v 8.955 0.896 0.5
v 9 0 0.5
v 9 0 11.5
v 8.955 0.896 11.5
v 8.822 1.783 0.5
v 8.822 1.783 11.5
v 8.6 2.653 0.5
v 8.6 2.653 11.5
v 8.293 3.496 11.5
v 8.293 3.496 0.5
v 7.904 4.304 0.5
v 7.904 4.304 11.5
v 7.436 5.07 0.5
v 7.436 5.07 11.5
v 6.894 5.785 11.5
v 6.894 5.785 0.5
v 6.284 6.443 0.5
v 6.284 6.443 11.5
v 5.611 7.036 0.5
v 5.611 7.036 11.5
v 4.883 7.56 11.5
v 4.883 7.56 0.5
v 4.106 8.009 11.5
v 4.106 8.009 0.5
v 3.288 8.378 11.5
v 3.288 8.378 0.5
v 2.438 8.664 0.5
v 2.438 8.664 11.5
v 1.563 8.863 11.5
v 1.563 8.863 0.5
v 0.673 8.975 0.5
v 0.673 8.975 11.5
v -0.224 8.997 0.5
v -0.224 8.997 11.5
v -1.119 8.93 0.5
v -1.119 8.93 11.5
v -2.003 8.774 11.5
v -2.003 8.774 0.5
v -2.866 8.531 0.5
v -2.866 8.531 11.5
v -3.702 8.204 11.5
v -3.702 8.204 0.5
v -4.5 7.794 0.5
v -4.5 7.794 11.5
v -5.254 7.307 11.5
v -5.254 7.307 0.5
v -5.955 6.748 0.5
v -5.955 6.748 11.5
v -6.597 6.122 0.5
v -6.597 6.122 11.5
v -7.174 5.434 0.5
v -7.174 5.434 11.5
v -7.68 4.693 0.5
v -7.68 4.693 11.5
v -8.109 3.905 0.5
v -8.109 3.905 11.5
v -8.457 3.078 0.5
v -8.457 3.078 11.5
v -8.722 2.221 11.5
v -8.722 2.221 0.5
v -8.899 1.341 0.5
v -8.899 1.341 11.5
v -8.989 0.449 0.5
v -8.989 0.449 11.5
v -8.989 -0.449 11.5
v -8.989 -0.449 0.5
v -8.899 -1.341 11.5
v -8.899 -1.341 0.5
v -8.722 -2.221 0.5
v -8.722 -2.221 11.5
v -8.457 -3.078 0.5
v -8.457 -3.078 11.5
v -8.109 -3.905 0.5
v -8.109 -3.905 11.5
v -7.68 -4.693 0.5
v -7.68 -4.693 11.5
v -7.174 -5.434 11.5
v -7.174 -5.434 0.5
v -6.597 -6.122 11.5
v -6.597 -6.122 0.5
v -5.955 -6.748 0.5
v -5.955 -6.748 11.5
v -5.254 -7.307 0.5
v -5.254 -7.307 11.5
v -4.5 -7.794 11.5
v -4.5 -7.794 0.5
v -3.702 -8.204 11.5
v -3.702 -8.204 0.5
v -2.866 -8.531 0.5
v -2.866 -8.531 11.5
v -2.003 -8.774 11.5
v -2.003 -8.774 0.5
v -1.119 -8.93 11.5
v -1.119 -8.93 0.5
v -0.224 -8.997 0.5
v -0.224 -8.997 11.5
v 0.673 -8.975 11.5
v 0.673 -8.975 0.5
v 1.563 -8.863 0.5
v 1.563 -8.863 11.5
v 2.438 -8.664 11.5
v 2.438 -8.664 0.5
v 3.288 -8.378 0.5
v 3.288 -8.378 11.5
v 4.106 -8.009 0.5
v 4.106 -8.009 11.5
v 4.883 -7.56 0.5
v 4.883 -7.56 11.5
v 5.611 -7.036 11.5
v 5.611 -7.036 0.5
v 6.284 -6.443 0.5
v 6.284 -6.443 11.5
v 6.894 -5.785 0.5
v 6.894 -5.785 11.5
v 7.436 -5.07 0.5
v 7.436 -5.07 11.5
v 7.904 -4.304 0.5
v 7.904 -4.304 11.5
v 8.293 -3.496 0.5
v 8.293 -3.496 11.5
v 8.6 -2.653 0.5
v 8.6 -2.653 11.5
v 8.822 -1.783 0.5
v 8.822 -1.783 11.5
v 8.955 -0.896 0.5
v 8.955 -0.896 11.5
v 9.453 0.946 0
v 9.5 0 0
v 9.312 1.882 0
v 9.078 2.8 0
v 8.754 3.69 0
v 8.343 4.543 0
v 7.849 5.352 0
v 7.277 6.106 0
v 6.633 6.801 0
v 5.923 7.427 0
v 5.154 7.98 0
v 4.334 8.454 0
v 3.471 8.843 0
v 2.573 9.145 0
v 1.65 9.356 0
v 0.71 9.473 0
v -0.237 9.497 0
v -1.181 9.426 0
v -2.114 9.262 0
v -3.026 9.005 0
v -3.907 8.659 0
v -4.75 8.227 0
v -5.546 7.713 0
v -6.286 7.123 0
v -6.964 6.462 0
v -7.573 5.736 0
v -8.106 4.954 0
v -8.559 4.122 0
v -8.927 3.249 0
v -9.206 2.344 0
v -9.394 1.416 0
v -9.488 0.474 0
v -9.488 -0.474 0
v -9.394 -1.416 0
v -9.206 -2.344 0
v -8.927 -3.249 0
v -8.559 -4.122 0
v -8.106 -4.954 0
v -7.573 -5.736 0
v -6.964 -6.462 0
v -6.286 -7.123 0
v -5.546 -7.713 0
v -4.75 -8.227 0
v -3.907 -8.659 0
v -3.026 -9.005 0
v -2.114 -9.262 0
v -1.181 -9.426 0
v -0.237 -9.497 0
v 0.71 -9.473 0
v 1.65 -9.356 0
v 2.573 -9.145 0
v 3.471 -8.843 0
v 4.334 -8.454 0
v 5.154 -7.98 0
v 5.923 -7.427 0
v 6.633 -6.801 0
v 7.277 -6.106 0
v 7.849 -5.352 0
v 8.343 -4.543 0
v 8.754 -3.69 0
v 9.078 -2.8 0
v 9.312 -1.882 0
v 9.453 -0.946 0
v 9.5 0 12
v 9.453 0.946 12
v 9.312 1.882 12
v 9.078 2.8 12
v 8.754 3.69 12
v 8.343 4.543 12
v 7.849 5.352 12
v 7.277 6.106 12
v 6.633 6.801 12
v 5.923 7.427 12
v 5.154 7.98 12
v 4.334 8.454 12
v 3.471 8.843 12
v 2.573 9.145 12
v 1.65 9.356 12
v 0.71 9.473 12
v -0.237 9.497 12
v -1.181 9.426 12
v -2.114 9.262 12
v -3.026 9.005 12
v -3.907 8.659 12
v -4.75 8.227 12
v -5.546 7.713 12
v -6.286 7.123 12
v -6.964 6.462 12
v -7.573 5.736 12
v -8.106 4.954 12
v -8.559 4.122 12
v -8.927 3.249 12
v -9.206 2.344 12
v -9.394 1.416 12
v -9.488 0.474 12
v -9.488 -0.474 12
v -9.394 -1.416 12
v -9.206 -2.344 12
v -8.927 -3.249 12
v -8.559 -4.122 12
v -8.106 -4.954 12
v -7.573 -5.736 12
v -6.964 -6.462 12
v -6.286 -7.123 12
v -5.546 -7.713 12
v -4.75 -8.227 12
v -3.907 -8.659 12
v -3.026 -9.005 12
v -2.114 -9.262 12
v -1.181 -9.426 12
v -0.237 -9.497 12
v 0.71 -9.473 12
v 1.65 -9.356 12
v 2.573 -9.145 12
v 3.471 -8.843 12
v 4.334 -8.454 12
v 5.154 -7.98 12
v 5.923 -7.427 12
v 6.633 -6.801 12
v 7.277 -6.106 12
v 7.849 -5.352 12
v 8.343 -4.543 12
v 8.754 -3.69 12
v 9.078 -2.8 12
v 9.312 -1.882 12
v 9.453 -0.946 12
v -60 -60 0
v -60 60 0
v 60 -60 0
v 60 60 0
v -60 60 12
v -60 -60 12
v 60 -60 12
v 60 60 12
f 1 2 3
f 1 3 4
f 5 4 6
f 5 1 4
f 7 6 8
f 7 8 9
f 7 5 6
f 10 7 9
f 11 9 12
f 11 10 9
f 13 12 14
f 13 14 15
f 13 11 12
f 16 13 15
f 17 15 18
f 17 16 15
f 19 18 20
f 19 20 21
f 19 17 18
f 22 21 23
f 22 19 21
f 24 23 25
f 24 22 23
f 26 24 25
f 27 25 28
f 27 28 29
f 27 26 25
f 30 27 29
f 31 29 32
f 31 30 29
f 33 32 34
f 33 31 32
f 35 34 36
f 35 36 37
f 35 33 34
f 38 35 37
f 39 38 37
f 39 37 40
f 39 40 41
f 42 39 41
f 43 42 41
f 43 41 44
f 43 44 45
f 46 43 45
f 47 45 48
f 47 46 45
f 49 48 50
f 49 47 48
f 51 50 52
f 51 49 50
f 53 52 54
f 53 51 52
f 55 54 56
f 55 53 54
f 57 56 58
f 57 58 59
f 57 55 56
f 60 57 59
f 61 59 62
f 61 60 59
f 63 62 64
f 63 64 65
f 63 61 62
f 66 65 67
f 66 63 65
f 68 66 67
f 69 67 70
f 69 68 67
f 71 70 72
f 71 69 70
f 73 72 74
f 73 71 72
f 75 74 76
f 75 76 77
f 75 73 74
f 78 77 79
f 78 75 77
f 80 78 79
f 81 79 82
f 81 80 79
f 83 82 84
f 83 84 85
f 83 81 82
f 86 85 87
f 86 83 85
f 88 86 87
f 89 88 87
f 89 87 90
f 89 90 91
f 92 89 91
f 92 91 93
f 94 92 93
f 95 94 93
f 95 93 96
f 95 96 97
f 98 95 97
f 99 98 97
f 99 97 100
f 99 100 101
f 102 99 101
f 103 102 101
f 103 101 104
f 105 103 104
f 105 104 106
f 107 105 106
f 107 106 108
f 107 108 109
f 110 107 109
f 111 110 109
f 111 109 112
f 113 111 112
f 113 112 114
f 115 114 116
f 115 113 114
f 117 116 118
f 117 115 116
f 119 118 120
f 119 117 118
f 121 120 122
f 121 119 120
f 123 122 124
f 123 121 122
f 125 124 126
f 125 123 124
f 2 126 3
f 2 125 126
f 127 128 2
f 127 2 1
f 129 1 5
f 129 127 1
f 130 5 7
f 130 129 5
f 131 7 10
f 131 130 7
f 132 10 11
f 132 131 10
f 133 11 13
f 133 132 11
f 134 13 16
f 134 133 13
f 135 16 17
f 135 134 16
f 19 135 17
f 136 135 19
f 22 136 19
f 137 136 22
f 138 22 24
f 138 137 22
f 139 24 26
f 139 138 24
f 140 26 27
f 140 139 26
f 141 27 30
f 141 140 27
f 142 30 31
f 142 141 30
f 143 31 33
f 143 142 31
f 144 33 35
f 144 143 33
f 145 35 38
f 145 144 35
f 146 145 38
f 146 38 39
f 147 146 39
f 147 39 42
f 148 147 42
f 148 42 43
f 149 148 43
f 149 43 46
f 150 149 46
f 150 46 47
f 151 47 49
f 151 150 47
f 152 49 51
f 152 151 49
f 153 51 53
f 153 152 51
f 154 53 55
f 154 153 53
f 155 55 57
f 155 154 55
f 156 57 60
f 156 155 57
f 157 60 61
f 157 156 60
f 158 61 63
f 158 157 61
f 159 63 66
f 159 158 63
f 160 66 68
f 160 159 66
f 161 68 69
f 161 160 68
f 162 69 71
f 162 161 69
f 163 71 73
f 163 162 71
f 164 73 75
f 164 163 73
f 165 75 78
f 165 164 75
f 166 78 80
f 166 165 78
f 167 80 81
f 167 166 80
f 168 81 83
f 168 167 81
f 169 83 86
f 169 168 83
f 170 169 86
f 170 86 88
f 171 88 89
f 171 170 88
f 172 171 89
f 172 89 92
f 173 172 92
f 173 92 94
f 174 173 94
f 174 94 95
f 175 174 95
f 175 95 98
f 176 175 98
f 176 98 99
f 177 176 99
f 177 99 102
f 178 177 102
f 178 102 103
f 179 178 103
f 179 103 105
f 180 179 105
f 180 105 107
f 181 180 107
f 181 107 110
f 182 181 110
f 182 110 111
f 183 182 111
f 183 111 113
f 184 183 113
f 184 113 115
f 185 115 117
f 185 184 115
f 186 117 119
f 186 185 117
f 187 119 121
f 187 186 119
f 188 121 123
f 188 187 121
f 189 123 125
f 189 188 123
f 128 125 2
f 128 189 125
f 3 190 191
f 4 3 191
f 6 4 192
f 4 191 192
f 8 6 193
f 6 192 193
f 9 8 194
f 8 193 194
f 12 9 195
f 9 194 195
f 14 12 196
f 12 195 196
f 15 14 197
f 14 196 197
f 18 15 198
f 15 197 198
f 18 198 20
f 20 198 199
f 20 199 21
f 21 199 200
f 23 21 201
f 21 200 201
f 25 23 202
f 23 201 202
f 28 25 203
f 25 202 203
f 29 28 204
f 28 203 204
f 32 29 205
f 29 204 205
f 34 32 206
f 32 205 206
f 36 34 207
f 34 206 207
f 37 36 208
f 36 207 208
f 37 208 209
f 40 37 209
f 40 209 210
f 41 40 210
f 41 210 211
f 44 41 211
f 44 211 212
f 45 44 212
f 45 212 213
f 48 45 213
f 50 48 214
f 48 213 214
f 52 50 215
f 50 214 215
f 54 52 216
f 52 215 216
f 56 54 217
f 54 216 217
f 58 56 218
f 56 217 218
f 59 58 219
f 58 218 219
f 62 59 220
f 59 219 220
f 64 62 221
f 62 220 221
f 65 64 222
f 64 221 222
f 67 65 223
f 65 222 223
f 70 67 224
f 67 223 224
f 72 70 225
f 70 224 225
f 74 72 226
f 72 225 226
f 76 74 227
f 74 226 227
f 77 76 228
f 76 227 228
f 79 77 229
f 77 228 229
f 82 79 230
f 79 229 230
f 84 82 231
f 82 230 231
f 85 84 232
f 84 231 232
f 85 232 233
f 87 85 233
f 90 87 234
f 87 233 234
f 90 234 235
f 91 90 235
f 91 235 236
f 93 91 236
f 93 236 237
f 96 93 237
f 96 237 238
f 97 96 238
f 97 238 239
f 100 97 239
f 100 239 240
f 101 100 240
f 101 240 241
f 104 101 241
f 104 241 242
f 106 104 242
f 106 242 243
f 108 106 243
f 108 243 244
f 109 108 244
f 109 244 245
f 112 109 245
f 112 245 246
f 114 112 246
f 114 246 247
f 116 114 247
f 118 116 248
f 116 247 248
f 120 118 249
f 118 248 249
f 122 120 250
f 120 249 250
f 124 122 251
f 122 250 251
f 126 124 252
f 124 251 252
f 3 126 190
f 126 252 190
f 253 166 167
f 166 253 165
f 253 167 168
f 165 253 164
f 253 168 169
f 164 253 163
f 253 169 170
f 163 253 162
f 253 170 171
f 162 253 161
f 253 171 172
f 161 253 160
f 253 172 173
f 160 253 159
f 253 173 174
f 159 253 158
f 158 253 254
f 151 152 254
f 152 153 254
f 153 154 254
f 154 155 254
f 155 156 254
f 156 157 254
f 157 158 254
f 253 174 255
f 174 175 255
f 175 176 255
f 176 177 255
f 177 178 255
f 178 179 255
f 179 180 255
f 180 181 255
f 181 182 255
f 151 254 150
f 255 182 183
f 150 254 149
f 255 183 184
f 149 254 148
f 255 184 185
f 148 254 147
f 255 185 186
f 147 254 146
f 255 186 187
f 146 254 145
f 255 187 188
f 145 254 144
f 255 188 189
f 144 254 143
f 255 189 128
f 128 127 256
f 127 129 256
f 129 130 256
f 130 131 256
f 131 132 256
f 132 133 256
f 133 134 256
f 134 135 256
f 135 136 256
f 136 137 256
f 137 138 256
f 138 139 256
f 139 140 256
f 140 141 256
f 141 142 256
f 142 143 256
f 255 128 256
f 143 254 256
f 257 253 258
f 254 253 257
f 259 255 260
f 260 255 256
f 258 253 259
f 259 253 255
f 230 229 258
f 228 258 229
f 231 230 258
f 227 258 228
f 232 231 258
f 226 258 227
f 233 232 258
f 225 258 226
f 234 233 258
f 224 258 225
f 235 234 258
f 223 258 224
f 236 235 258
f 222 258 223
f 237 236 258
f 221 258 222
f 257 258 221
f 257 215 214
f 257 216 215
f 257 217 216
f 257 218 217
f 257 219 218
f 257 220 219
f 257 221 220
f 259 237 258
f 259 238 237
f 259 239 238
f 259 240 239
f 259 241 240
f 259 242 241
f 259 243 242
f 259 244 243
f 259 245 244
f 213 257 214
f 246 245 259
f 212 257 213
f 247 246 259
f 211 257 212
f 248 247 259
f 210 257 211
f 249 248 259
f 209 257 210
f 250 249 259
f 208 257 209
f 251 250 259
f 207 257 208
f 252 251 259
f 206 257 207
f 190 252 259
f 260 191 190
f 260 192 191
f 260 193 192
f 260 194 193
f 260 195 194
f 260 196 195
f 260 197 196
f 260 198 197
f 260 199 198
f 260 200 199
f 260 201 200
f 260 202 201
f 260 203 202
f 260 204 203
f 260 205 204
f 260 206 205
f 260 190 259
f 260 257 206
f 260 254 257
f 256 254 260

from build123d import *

# Parameters (mm, degrees)
F0_W     = 120
F0_H     = 120
F0_R     = 9
F1_DEPTH = 12
F2_SIZE  = 0.5


with BuildPart() as f1:
    # F0 (on Top) → F1 (new body)
    with BuildSketch(Plane.XY):
        Rectangle(F0_W, F0_H)
        Circle(F0_R, mode=Mode.SUBTRACT)
    extrude(amount=F1_DEPTH)

    # F2
    f2_edges = [f1.edges().sort_by_distance(p)[0] for p in [
        (9, 0, 6),
        (-9, 0, 0),
        (-9, 0, 12),
    ]]
    chamfer(f2_edges, length=F2_SIZE)


solid = f1.part
